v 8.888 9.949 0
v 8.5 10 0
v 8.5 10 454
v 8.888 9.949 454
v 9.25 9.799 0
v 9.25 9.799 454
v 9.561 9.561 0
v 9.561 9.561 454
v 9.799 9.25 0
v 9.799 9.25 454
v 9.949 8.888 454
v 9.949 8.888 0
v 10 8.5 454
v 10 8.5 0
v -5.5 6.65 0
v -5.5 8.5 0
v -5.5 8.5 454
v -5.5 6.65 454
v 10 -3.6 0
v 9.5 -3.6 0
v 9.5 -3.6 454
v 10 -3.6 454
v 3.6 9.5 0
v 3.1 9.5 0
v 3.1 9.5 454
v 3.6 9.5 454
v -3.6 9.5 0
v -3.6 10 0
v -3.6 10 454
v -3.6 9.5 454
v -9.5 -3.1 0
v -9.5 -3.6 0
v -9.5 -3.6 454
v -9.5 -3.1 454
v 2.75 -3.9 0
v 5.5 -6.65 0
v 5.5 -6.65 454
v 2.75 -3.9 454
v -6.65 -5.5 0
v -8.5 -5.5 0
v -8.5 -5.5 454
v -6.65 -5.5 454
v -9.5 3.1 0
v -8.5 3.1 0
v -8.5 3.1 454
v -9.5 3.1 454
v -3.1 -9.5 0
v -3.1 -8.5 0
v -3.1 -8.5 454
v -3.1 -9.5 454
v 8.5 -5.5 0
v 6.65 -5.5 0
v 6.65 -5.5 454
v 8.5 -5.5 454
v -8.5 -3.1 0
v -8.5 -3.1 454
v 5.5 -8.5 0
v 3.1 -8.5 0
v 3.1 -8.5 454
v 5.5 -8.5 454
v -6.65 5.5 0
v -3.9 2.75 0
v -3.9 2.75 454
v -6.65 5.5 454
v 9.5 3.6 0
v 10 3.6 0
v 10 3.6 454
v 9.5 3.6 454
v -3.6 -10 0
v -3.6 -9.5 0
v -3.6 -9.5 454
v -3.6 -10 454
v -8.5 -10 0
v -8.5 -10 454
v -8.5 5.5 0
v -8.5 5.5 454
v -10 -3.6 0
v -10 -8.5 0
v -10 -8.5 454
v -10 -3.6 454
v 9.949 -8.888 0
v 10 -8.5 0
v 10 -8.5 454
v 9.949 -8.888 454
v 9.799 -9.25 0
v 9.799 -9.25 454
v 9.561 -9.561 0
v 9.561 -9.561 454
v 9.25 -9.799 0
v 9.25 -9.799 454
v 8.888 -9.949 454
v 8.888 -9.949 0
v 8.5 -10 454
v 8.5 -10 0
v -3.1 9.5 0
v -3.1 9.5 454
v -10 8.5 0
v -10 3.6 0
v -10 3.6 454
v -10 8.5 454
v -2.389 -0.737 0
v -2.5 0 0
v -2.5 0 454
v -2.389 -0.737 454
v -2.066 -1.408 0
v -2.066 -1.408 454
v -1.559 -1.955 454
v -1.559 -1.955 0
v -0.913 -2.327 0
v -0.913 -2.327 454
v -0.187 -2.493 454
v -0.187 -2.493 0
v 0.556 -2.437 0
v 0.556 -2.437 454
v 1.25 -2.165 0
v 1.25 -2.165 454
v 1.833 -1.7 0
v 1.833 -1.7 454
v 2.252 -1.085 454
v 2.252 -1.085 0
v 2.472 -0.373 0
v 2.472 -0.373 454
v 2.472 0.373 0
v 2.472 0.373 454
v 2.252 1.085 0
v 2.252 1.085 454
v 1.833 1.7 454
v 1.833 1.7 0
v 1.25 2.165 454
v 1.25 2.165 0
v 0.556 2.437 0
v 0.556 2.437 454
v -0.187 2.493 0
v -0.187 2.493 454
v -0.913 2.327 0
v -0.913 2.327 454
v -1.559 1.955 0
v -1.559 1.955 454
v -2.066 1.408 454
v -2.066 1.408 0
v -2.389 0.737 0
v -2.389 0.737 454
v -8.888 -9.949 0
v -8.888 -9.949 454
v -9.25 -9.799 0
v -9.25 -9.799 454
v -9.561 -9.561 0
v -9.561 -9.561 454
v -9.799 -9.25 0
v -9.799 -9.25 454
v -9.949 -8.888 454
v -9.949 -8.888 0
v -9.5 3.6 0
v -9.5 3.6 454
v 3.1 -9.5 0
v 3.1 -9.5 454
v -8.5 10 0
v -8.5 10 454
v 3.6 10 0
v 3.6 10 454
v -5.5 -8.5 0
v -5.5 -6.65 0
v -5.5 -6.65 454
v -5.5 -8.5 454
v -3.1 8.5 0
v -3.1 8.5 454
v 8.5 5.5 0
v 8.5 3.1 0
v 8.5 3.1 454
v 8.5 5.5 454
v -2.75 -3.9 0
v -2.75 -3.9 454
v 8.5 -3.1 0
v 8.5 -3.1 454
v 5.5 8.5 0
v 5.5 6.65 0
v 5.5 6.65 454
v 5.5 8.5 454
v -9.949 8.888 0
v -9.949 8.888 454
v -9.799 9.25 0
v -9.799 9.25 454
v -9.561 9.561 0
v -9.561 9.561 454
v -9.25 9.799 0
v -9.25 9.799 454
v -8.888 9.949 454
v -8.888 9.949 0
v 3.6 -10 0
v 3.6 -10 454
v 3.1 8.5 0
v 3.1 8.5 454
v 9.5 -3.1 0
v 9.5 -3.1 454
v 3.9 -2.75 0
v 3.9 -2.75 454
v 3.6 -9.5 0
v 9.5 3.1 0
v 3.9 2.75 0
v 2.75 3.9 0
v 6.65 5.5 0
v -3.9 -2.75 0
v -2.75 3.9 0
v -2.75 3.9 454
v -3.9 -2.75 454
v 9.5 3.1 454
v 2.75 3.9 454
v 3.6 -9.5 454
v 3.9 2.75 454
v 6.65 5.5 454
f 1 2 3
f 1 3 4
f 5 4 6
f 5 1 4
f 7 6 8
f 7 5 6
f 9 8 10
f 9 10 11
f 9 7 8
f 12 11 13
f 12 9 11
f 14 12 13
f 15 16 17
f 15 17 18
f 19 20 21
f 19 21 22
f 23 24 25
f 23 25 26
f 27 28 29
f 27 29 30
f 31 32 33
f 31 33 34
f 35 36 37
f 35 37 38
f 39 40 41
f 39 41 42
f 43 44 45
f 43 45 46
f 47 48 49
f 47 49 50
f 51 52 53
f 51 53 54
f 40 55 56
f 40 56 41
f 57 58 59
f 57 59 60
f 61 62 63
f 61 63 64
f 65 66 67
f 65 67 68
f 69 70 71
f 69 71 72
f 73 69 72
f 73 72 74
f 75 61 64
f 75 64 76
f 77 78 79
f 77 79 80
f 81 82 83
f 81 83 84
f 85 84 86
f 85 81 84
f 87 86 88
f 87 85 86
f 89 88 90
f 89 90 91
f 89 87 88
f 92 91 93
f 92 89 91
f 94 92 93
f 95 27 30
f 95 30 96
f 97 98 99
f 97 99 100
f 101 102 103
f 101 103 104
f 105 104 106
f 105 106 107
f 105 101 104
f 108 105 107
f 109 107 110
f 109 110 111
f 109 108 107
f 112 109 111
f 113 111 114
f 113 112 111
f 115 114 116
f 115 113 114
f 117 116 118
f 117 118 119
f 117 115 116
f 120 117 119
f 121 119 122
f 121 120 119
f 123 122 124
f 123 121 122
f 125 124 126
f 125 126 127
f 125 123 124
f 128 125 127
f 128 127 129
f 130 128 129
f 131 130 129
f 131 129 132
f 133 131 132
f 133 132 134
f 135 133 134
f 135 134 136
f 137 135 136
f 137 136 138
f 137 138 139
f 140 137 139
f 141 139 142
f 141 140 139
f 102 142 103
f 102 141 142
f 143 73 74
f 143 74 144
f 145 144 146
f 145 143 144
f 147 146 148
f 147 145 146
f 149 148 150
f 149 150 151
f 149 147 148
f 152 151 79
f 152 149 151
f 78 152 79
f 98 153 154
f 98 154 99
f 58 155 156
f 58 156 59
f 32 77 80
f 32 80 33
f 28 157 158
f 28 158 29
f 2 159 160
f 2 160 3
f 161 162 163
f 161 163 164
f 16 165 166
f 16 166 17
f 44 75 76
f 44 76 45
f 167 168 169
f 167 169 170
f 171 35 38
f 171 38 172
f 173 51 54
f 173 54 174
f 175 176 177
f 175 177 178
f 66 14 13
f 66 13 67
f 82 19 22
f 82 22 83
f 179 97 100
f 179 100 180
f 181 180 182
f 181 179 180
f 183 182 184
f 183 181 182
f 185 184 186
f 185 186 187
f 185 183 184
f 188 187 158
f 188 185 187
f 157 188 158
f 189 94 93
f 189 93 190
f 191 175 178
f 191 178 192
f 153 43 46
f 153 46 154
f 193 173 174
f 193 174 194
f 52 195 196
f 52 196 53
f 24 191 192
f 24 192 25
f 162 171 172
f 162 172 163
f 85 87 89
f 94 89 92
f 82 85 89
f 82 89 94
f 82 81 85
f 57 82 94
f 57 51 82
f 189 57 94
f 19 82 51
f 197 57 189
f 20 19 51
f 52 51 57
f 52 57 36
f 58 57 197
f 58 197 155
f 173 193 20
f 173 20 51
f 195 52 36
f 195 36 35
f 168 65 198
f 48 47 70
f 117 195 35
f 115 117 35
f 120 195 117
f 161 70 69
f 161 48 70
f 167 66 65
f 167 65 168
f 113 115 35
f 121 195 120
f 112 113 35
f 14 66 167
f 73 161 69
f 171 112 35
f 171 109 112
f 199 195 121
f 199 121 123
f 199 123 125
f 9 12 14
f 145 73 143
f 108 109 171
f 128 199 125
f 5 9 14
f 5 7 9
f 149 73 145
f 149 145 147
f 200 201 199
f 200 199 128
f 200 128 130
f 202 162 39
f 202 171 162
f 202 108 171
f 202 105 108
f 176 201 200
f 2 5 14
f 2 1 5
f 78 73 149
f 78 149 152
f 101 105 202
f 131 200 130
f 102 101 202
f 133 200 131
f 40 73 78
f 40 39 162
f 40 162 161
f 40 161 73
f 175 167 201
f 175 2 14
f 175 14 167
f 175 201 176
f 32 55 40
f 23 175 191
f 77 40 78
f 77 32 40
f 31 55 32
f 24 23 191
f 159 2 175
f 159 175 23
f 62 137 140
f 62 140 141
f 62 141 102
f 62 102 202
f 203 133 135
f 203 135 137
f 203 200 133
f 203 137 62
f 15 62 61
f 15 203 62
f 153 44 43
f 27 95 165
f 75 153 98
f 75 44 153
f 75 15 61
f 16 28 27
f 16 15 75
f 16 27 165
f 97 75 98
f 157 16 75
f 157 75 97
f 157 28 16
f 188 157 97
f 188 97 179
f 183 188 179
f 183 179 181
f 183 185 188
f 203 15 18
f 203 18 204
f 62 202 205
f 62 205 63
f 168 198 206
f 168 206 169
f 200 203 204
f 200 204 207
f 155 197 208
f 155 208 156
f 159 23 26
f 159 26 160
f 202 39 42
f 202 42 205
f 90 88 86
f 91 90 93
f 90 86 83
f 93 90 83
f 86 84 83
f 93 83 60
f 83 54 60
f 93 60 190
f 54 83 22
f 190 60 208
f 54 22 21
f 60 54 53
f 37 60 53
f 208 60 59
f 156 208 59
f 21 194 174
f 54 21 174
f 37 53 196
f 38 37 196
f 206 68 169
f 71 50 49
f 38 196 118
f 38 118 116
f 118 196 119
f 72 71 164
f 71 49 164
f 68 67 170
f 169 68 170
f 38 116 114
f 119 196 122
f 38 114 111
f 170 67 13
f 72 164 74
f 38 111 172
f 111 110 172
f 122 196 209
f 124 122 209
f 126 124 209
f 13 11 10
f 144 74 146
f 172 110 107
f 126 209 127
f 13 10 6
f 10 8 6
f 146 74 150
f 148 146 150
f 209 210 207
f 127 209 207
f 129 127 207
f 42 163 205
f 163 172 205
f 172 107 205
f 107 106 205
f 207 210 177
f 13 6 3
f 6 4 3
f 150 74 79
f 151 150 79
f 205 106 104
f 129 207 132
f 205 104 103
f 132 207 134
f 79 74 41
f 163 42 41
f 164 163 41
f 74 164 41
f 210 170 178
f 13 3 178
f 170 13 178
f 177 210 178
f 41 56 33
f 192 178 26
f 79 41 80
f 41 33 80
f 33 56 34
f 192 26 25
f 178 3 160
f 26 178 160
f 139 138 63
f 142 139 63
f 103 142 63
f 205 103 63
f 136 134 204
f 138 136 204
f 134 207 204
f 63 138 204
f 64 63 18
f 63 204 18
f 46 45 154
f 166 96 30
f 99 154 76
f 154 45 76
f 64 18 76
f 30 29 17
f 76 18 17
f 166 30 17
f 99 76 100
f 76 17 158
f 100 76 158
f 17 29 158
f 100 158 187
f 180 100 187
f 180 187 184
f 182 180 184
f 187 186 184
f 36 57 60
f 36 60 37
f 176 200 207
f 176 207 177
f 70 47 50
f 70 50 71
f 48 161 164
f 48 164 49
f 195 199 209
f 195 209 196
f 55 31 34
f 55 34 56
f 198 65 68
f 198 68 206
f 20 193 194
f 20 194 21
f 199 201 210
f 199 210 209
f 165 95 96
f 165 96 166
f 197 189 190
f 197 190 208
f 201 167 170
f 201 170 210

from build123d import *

# Parameters (mm, degrees)
SKETCH1_R       = 2.5
EXTRUDE_1_DEPTH = 454


with BuildPart() as part:
    # Sketch1 → 凸台-拉伸1 (new body)
    with BuildSketch(Plane.XY):
        with BuildLine():
            Line((-3.6, 10), (-3.6, 9.5))
            Line((-3.6, 9.5), (-3.1, 9.5))
            Line((-3.1, 9.5), (-3.1, 8.5))
            Line((-3.1, 8.5), (-5.5, 8.5))
            Line((-5.5, 8.5), (-5.5, 6.65))
            Line((-5.5, 6.65), (-2.75, 3.9))
            Line((-2.75, 3.9), (2.75, 3.9))
            Line((2.75, 3.9), (5.5, 6.65))
            Line((5.5, 6.65), (5.5, 8.5))
            Line((5.5, 8.5), (3.1, 8.5))
            Line((3.1, 8.5), (3.1, 9.5))
            Line((3.1, 9.5), (3.6, 9.5))
            Line((3.6, 9.5), (3.6, 10))
            Line((3.6, 10), (8.5, 10))
            ThreePointArc((8.5, 10), (9.560660172, 9.560660172), (10, 8.5))
            Line((10, 8.5), (10, 3.6))
            Line((10, 3.6), (9.5, 3.6))
            Line((9.5, 3.6), (9.5, 3.1))
            Line((9.5, 3.1), (8.5, 3.1))
            Line((8.5, 3.1), (8.5, 5.5))
            Line((8.5, 5.5), (6.65, 5.5))
            Line((6.65, 5.5), (3.9, 2.75))
            Line((3.9, 2.75), (3.9, -2.75))
            Line((3.9, -2.75), (6.65, -5.5))
            Line((6.65, -5.5), (8.5, -5.5))
            Line((8.5, -5.5), (8.5, -3.1))
            Line((8.5, -3.1), (9.5, -3.1))
            Line((9.5, -3.1), (9.5, -3.6))
            Line((9.5, -3.6), (10, -3.6))
            Line((10, -3.6), (10, -8.5))
            ThreePointArc((10, -8.5), (9.560660172, -9.560660172), (8.5, -10))
            Line((8.5, -10), (3.6, -10))
            Line((3.6, -10), (3.6, -9.5))
            Line((3.6, -9.5), (3.1, -9.5))
            Line((3.1, -9.5), (3.1, -8.5))
            Line((3.1, -8.5), (5.5, -8.5))
            Line((5.5, -8.5), (5.5, -6.65))
            Line((5.5, -6.65), (2.75, -3.9))
            Line((2.75, -3.9), (-2.75, -3.9))
            Line((-2.75, -3.9), (-5.5, -6.65))
            Line((-5.5, -6.65), (-5.5, -8.5))
            Line((-5.5, -8.5), (-3.1, -8.5))
            Line((-3.1, -8.5), (-3.1, -9.5))
            Line((-3.1, -9.5), (-3.6, -9.5))
            Line((-3.6, -9.5), (-3.6, -10))
            Line((-3.6, -10), (-8.5, -10))
            ThreePointArc((-8.5, -10), (-9.560660172, -9.560660172), (-10, -8.5))
            Line((-10, -8.5), (-10, -3.6))
            Line((-10, -3.6), (-9.5, -3.6))
            Line((-9.5, -3.6), (-9.5, -3.1))
            Line((-9.5, -3.1), (-8.5, -3.1))
            Line((-8.5, -3.1), (-8.5, -5.5))
            Line((-8.5, -5.5), (-6.65, -5.5))
            Line((-6.65, -5.5), (-3.9, -2.75))
            Line((-3.9, -2.75), (-3.9, 2.75))
            Line((-3.9, 2.75), (-6.65, 5.5))
            Line((-6.65, 5.5), (-8.5, 5.5))
            Line((-8.5, 5.5), (-8.5, 3.1))
            Line((-8.5, 3.1), (-9.5, 3.1))
            Line((-9.5, 3.1), (-9.5, 3.6))
            Line((-9.5, 3.6), (-10, 3.6))
            Line((-10, 3.6), (-10, 8.5))
            ThreePointArc((-10, 8.5), (-9.560660172, 9.560660172), (-8.5, 10))
            Line((-8.5, 10), (-3.6, 10))
        make_face()
        with Locations(Location((0, 0, 0), (0, 0, 180))):
            Circle(SKETCH1_R, mode=Mode.SUBTRACT)
    extrude(amount=EXTRUDE_1_DEPTH)


solid = part.part
